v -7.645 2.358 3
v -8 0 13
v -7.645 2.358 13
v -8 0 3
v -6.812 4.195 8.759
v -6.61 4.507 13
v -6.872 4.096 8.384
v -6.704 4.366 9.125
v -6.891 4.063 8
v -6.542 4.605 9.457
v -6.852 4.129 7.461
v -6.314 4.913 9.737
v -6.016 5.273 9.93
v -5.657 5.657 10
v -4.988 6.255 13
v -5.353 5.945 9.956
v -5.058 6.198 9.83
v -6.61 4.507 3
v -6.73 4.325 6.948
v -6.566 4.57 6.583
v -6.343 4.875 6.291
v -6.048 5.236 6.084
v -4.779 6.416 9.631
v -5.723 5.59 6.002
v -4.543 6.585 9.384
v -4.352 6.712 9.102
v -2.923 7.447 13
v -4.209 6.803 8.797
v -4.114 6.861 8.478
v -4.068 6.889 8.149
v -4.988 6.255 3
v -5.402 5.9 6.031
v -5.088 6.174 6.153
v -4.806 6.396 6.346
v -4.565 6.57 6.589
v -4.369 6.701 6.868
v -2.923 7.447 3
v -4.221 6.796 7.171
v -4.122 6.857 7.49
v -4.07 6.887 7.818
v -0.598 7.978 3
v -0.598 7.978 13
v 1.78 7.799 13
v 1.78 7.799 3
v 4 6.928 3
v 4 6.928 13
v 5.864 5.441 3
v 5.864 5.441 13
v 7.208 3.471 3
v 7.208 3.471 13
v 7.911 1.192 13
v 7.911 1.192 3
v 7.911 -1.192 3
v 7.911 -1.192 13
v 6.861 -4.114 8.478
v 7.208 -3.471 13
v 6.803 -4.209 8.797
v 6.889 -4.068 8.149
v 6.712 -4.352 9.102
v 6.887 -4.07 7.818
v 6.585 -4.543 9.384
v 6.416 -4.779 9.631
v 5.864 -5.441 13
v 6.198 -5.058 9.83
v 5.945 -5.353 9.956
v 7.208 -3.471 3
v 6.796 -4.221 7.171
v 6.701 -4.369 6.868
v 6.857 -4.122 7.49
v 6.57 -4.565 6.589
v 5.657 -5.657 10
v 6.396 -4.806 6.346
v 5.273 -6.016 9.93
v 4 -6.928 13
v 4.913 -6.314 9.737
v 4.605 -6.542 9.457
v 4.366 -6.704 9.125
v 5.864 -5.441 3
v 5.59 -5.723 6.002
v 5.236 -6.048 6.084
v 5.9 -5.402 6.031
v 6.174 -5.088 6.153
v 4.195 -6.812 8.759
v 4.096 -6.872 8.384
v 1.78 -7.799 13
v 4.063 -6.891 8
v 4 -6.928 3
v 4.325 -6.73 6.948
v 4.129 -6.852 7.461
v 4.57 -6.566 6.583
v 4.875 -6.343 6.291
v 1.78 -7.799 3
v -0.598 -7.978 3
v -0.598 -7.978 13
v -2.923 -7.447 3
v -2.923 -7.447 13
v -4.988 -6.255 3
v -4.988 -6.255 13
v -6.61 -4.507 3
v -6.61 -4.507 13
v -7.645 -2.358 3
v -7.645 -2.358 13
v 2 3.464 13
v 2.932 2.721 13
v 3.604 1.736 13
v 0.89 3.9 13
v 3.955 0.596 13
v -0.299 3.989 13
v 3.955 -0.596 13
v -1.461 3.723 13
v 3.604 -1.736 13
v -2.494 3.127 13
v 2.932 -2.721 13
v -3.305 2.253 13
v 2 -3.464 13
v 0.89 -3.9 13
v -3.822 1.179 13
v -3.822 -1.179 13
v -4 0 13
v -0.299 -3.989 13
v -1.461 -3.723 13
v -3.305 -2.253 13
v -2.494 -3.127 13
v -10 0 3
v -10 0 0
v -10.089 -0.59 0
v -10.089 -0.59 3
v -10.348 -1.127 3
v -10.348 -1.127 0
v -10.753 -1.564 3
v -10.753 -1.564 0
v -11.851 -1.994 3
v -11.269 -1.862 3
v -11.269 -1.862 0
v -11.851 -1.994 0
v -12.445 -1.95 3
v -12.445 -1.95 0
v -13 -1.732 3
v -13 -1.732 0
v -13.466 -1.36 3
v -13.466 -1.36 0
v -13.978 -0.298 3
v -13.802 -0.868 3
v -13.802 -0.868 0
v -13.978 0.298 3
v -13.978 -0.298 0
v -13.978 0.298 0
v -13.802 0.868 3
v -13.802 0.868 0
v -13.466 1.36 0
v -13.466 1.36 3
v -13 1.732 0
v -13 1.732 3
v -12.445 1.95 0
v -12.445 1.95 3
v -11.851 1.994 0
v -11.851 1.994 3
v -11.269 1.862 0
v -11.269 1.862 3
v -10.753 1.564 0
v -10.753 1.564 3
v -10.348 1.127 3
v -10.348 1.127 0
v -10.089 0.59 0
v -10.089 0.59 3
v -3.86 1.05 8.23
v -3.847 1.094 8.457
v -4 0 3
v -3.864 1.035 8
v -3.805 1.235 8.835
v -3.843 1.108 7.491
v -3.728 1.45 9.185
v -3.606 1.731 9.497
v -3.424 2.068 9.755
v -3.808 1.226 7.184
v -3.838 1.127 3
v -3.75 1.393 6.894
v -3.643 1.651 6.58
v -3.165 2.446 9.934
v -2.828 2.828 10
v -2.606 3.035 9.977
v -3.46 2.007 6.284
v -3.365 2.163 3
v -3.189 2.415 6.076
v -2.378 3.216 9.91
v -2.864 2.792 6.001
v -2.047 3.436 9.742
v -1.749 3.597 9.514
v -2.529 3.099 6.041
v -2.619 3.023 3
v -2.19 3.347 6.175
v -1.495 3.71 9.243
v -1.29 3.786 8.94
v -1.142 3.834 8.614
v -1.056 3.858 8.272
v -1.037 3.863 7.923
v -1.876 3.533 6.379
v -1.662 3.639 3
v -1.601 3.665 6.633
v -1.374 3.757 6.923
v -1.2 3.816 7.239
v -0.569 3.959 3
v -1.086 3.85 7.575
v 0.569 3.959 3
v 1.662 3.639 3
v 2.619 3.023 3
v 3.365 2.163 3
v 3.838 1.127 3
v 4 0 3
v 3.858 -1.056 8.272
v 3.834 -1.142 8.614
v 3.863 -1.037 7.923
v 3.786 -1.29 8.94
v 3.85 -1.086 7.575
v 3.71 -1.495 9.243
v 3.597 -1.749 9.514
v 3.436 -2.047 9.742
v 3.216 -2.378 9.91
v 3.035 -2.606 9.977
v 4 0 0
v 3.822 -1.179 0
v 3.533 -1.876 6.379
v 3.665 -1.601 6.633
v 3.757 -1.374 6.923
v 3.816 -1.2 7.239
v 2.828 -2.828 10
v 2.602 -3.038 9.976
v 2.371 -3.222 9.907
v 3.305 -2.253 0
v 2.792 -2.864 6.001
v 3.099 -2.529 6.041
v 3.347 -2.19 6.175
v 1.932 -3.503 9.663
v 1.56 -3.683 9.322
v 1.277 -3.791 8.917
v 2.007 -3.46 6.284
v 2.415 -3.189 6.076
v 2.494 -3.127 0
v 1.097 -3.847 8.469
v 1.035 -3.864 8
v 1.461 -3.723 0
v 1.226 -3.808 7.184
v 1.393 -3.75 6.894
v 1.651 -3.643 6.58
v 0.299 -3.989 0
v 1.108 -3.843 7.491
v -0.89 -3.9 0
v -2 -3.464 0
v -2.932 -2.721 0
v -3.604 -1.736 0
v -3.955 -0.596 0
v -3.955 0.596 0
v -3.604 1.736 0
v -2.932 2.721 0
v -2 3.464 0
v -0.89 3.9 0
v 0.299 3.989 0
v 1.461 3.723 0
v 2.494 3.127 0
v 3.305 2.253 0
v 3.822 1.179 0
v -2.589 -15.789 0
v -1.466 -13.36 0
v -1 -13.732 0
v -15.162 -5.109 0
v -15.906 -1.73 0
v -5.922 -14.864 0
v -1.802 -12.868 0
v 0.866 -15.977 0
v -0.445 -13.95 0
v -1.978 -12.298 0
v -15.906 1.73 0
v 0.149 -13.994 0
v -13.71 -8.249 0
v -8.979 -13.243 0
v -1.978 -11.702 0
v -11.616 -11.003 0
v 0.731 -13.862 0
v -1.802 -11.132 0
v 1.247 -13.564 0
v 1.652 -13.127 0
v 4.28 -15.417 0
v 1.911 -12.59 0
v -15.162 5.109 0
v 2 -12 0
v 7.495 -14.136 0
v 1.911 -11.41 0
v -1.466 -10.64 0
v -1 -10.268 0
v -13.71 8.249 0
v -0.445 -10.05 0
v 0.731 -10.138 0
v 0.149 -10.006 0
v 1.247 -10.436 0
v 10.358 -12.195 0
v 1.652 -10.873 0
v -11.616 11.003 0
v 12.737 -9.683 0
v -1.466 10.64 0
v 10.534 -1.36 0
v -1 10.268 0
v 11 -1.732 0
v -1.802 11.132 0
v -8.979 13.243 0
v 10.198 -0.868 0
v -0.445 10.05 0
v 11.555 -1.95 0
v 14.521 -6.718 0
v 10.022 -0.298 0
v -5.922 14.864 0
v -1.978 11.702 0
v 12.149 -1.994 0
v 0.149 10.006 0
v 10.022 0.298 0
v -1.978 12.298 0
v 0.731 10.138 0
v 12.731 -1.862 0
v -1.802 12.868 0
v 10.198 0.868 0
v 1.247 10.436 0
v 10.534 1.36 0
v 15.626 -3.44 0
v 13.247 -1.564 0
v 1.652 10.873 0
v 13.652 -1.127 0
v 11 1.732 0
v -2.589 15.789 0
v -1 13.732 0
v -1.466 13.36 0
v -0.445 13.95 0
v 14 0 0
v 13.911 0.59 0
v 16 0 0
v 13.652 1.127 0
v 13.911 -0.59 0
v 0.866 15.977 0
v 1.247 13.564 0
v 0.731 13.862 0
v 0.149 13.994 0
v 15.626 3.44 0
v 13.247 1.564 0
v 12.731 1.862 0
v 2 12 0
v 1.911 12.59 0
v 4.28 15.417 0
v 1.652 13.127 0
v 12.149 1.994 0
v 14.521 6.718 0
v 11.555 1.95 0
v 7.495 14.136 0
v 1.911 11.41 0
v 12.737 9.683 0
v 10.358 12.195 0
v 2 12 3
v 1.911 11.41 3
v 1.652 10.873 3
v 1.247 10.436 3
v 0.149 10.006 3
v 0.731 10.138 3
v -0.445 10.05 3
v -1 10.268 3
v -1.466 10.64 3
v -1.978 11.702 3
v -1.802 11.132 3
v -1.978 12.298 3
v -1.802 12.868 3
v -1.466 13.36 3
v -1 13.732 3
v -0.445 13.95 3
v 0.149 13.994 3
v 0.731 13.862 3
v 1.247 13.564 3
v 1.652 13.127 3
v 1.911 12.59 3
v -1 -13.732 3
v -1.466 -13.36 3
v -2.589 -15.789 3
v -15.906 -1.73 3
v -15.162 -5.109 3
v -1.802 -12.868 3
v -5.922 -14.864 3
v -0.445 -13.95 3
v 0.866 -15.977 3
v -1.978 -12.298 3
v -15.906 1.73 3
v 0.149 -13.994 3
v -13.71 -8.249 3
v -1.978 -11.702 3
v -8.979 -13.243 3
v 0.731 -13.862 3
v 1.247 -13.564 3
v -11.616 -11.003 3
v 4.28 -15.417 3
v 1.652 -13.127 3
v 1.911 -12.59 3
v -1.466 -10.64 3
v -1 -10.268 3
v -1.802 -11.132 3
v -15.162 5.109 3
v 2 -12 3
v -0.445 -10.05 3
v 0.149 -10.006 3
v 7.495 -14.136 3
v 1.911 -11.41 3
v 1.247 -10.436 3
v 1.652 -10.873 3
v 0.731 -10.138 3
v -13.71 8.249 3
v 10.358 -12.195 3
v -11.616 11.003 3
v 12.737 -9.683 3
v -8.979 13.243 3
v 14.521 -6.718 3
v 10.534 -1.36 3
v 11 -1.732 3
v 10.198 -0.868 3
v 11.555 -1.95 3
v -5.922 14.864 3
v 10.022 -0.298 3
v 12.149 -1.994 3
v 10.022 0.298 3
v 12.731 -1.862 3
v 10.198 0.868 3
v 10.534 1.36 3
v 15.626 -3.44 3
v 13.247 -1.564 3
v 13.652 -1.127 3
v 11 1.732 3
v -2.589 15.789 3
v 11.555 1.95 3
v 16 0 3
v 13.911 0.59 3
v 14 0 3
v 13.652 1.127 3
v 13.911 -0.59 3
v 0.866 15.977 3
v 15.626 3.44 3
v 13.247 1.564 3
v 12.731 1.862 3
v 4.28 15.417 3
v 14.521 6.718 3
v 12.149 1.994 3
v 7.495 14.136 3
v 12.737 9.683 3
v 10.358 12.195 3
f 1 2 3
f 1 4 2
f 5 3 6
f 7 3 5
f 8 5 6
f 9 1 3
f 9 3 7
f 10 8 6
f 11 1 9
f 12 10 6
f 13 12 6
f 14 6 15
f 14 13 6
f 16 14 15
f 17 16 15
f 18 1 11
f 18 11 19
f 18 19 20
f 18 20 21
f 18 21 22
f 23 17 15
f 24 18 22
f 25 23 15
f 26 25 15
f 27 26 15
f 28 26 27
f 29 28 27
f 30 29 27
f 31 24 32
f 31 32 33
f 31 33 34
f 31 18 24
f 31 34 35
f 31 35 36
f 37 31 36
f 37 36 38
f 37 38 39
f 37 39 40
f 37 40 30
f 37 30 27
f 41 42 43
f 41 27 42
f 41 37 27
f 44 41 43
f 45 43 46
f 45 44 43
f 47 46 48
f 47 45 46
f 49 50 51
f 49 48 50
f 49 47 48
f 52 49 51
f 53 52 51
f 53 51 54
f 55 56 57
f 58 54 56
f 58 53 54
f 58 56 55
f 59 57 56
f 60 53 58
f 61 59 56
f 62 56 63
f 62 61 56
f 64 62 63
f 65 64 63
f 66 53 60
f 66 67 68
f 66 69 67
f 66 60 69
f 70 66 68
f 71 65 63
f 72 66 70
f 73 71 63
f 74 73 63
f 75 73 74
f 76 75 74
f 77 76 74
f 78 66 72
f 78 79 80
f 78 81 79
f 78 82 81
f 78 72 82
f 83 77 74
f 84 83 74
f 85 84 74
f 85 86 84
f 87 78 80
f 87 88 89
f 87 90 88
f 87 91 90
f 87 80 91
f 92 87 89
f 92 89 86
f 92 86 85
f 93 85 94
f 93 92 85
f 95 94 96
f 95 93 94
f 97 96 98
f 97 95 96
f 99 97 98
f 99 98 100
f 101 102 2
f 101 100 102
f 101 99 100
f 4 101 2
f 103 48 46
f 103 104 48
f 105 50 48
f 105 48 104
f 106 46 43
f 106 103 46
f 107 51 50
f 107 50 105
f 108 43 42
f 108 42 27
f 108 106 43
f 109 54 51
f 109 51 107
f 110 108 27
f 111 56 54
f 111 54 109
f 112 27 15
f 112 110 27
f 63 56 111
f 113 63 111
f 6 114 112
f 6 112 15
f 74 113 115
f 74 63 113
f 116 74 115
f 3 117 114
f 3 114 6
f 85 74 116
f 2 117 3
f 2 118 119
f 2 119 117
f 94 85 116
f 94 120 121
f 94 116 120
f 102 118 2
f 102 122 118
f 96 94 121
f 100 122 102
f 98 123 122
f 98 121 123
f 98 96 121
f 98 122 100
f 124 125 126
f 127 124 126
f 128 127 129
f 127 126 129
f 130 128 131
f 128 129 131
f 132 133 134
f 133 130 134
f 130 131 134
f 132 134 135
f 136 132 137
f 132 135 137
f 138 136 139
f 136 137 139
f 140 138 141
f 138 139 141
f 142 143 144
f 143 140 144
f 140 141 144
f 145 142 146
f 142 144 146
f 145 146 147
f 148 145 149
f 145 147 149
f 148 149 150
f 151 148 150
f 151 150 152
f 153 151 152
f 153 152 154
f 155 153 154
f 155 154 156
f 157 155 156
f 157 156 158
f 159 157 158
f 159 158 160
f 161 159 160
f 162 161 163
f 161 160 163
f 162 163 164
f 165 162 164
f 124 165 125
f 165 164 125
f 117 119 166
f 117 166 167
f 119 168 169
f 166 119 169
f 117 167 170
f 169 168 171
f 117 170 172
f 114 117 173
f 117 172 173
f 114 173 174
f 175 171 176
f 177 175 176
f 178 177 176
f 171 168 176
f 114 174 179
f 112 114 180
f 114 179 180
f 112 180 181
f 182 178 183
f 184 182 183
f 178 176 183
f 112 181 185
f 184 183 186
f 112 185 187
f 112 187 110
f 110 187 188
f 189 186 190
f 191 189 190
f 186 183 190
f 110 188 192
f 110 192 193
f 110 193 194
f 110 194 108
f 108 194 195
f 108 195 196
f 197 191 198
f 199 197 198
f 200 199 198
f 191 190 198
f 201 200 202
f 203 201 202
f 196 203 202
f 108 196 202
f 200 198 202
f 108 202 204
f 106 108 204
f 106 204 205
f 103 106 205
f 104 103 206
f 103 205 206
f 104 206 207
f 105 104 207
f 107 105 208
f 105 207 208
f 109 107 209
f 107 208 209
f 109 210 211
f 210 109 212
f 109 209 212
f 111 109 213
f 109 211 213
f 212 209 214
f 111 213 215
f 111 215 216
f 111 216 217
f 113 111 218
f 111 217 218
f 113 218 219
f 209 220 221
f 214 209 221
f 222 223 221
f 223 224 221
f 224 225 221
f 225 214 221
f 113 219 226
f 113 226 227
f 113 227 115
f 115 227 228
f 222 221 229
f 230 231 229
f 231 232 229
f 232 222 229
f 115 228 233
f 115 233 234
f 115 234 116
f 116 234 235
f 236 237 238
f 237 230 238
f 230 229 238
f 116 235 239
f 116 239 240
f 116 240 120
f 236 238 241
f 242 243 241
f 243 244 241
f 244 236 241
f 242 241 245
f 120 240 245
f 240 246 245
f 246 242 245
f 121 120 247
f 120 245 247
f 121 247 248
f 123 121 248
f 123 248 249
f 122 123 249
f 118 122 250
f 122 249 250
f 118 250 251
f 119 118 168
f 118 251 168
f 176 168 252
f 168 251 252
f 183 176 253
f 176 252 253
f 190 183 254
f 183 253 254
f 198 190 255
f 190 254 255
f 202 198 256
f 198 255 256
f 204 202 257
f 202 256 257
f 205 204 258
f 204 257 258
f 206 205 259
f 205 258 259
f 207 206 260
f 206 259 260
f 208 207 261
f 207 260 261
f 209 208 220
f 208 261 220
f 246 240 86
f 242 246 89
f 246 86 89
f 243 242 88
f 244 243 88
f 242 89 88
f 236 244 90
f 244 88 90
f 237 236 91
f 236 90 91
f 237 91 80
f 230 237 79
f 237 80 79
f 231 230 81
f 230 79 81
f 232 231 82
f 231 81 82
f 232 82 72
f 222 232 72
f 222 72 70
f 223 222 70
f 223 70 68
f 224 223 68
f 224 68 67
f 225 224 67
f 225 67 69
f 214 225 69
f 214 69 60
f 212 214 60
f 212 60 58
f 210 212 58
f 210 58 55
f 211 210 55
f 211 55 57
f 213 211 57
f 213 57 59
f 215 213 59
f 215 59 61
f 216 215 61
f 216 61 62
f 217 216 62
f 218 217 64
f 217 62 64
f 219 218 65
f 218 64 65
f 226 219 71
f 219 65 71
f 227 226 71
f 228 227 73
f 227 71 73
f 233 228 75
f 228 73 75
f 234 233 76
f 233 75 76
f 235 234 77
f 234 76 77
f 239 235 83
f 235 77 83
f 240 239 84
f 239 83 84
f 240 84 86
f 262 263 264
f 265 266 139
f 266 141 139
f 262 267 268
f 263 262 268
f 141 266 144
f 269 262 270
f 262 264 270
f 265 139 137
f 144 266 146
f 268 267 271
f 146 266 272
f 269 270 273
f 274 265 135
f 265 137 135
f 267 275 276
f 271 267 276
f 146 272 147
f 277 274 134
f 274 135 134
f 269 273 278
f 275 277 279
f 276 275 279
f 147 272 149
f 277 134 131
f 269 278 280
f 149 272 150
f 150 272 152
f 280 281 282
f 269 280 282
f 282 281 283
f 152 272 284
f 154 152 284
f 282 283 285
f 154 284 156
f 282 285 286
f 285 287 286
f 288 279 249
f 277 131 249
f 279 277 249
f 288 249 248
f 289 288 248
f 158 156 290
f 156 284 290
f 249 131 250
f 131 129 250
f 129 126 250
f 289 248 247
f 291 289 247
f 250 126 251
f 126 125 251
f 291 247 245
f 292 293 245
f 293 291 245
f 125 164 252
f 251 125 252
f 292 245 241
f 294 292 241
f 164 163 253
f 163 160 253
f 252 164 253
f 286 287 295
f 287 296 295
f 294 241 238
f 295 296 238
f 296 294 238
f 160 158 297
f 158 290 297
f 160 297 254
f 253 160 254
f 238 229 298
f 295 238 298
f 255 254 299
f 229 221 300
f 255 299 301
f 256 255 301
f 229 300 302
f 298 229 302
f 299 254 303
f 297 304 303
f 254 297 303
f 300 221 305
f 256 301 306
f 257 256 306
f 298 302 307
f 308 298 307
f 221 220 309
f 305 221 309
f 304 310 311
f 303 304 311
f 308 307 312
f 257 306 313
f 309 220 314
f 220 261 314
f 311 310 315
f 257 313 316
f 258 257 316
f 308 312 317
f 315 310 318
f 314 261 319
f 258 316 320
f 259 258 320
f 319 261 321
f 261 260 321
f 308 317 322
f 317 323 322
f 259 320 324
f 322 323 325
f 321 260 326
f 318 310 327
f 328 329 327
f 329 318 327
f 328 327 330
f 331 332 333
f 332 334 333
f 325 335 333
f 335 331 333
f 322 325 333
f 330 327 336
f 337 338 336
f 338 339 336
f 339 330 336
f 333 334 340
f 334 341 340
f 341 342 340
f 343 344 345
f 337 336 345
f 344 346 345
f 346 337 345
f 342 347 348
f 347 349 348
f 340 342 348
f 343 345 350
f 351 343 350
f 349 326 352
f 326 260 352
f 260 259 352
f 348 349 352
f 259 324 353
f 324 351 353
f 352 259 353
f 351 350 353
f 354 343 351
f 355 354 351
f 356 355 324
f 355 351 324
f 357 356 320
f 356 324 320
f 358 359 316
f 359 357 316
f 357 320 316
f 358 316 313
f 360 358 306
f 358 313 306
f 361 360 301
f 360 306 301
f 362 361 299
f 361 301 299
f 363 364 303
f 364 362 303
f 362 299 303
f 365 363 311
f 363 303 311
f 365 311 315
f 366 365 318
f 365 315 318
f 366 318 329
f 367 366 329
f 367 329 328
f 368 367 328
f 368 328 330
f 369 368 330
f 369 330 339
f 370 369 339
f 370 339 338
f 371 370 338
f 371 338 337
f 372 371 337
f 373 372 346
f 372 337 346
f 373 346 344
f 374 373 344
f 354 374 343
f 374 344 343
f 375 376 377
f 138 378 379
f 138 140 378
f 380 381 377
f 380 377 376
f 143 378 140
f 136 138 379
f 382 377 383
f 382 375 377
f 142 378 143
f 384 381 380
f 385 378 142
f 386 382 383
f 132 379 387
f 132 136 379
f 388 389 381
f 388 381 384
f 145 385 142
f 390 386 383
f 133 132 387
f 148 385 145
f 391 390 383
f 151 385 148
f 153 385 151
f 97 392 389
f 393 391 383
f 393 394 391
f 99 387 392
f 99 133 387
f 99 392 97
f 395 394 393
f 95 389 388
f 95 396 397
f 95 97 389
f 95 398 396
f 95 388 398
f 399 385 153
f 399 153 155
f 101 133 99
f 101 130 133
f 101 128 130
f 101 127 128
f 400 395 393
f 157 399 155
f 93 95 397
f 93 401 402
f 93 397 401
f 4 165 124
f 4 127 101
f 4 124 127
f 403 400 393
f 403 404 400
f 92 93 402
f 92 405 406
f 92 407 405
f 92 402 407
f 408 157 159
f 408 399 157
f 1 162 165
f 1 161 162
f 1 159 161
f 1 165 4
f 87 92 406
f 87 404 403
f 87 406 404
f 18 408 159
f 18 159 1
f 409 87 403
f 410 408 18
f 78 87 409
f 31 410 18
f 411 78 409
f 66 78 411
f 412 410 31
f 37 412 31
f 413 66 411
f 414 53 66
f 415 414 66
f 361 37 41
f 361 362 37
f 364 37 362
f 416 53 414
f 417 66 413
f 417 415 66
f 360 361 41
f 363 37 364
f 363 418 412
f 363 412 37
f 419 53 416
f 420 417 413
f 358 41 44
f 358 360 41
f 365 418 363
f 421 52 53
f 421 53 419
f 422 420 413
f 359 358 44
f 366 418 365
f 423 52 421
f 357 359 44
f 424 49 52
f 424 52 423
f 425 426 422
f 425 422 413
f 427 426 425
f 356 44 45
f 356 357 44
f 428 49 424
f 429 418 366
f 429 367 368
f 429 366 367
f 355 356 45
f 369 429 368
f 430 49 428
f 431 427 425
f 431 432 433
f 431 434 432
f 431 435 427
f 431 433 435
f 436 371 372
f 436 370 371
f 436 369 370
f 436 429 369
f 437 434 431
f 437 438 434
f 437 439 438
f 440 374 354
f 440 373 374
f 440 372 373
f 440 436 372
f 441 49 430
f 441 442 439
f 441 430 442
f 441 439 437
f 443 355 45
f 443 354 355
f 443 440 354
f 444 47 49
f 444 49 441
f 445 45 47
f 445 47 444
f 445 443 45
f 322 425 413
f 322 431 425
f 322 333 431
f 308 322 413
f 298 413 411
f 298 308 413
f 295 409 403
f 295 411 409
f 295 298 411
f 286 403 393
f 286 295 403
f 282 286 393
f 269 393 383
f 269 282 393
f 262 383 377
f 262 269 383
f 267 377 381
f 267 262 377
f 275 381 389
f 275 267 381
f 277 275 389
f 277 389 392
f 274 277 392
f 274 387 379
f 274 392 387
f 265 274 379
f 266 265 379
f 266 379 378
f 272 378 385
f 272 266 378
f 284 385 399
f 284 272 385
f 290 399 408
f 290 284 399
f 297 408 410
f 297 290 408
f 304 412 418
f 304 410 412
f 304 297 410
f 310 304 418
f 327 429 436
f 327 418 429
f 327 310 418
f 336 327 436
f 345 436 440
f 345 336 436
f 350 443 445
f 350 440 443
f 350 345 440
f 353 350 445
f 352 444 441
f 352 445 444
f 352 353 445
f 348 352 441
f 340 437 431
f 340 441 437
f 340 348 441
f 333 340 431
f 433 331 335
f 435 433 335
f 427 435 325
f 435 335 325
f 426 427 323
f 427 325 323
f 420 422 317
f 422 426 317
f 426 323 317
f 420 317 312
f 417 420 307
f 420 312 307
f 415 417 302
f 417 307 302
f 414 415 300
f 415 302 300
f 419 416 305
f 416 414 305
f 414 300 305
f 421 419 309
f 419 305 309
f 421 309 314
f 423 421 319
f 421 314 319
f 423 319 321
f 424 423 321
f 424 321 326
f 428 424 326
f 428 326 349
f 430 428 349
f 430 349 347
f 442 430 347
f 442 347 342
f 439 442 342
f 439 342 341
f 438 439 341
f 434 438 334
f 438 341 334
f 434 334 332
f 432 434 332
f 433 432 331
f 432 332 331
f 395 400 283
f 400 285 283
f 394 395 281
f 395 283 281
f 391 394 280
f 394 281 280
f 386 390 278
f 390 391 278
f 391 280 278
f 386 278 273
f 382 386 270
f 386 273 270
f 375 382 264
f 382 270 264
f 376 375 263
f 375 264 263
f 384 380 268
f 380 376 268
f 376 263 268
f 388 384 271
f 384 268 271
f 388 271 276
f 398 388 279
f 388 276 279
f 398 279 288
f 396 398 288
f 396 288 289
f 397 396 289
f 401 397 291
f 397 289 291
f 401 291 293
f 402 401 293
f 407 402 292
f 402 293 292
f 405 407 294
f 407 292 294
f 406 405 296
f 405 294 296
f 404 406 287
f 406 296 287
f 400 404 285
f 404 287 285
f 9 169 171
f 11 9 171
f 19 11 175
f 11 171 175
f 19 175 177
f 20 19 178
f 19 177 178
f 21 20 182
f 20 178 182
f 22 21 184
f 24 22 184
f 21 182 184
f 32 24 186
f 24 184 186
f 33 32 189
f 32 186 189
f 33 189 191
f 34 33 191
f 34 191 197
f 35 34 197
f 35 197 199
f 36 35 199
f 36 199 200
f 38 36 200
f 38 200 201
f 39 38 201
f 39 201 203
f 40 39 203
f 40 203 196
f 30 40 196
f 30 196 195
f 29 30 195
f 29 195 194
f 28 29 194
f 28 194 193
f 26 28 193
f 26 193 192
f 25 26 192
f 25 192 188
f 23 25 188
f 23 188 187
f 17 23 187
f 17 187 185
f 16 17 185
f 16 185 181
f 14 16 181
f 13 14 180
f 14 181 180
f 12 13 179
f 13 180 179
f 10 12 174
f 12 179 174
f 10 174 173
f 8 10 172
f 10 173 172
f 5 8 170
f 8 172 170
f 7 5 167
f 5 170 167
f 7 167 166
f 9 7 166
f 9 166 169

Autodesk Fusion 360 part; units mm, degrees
sketch "Sketch1" plane through (0, 0, 0) normal (0, 0, 1) x (1, 0, 0)
  circle A0 centre (0, 0) radius 16
  circle A1 centre (0, 0) radius 12 construction
  line L0 (0, 0) -> (0, 16) construction
  circle A2 centre (0, 12) radius 2
  circle A3 centre (-12, 0) radius 2
  circle A4 centre (0, -12) radius 2
  circle A5 centre (12, 0) radius 2
  circle A6 centre (0, 0) radius 4
  dimension "d1" = 32
  dimension "d2" = 24
  dimension "d3" = 4
  dimension "d5" = 360
  dimension "d6" = 8
extrude "Extrude1" add sketch "Sketch1" along normal blind 3
sketch "Sketch2" plane through (0, 0, 3) normal (0, 0, 1) x (-1, 0, 0)
  circle A0 centre (0, -12) radius 2
  circle A1 centre (12, 0) radius 2
  circle A2 centre (0, 12) radius 2
  circle A3 centre (-12, 0) radius 2
  circle A4 centre (0, 0) radius 4
  circle A5 centre (0, 0) radius 16
  circle A6 centre (0, 0) radius 8
  dimension "d9" = 16
extrude "Extrude2" add sketch "Sketch2" along normal blind 10 contours A6
ref_plane "WorkPlane1" through (5.6569, -5.6569, 11.1327) normal (0.7071, -0.7071, 0) x (-0.7071, -0.7071, 0)
sketch "Sketch3" plane through (5.6569, -5.6569, 0) normal (0.7071, -0.7071, 0) x (-0.7071, -0.7071, 0)
  line L0 (-8, -13) -> (8, -13)
  line L1 (8, -3) -> (-8, -3)
  line L2 (0, -13) -> (0, -3) construction
  circle A0 centre (0, -8) radius 2
  line L3 (0, -8) -> (0, -10)
  dimension "d13" = 4
  dimension "d14" = 3
extrude "Extrude3" cut sketch "Sketch3" against normal blind 18
